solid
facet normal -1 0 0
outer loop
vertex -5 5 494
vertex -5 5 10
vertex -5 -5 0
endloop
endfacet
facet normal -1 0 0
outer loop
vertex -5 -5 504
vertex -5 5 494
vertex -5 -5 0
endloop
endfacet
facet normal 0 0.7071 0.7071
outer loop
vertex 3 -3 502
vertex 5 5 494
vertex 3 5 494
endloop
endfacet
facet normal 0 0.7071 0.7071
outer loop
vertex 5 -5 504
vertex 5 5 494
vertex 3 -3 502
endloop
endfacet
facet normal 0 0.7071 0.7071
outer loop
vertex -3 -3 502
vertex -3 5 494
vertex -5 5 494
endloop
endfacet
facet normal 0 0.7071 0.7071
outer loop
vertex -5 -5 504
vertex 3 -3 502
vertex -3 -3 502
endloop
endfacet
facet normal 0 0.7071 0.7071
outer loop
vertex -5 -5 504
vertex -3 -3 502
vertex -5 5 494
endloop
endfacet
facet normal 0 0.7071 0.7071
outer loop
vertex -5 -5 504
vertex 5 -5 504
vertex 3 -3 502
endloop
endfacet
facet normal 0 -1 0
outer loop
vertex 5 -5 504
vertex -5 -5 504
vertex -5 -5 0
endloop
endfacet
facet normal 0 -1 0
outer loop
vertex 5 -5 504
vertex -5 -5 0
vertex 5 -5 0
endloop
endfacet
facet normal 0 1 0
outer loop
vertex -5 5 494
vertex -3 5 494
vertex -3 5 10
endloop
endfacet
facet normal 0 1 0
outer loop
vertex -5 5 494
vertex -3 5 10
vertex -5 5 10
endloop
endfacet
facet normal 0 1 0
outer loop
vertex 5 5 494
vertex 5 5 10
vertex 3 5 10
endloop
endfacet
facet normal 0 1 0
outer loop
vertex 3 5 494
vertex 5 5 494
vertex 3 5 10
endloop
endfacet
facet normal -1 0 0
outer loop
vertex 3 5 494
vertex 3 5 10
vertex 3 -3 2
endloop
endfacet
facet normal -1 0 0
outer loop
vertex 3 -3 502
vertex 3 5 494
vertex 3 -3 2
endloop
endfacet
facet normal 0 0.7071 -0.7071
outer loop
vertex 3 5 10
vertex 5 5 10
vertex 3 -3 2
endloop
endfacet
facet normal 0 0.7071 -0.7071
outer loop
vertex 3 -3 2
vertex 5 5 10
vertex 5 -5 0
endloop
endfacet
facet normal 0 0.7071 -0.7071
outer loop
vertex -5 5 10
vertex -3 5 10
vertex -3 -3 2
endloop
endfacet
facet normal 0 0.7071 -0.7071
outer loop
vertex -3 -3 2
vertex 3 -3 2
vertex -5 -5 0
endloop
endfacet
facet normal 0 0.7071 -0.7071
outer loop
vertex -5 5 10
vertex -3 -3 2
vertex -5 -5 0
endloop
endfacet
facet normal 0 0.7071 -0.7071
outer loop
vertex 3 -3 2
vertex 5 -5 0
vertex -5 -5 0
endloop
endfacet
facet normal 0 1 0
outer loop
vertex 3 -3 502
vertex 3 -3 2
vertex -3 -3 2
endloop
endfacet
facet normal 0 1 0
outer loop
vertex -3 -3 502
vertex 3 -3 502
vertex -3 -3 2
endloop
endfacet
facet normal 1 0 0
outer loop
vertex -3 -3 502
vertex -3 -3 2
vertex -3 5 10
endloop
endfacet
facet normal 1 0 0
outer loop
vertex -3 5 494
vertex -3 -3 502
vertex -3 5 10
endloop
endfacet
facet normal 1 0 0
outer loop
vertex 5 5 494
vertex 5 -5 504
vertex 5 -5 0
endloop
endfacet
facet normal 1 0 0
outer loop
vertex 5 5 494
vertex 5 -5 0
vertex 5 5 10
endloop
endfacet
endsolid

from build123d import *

# Parameters (mm, degrees)
F1_DEPTH   = 504
F2_C1_SIZE = 9.9999
F2_C2_SIZE = 9.9999


# Not quite as in the source:
# - a fillet or chamfer is up to 0.001 mm smaller than in the source, because OpenCascade refuses the exact size


with BuildPart() as f1:
    # F0 (on Top) → F1 (new body)
    with BuildSketch(Plane.XY):
        Polygon((-3, 5), (-5, 5), (-5, -5), (5, -5), (5, 5), (3, 5), (3, -3), (-3, -3), align=None)
    extrude(amount=F1_DEPTH)

    # F2: chamfer of 10 on 4 edges, made by hand

    # F2_c1 (size 10 in the source; OpenCascade refuses exactly that, so slightly less here)
    f2_c1_edges = [f1.edges().sort_by_distance(p)[0] for p in [
        (-4, 5, 0),
    ]]
    chamfer(f2_c1_edges, length=F2_C1_SIZE)

    # F2_c2 (size 10 in the source; OpenCascade refuses exactly that, so slightly less here)
    f2_c2_edges = [f1.edges().sort_by_distance(p)[0] for p in [
        (-4, 5, 504),
    ]]
    chamfer(f2_c2_edges, length=F2_C2_SIZE)


solid = f1.part
